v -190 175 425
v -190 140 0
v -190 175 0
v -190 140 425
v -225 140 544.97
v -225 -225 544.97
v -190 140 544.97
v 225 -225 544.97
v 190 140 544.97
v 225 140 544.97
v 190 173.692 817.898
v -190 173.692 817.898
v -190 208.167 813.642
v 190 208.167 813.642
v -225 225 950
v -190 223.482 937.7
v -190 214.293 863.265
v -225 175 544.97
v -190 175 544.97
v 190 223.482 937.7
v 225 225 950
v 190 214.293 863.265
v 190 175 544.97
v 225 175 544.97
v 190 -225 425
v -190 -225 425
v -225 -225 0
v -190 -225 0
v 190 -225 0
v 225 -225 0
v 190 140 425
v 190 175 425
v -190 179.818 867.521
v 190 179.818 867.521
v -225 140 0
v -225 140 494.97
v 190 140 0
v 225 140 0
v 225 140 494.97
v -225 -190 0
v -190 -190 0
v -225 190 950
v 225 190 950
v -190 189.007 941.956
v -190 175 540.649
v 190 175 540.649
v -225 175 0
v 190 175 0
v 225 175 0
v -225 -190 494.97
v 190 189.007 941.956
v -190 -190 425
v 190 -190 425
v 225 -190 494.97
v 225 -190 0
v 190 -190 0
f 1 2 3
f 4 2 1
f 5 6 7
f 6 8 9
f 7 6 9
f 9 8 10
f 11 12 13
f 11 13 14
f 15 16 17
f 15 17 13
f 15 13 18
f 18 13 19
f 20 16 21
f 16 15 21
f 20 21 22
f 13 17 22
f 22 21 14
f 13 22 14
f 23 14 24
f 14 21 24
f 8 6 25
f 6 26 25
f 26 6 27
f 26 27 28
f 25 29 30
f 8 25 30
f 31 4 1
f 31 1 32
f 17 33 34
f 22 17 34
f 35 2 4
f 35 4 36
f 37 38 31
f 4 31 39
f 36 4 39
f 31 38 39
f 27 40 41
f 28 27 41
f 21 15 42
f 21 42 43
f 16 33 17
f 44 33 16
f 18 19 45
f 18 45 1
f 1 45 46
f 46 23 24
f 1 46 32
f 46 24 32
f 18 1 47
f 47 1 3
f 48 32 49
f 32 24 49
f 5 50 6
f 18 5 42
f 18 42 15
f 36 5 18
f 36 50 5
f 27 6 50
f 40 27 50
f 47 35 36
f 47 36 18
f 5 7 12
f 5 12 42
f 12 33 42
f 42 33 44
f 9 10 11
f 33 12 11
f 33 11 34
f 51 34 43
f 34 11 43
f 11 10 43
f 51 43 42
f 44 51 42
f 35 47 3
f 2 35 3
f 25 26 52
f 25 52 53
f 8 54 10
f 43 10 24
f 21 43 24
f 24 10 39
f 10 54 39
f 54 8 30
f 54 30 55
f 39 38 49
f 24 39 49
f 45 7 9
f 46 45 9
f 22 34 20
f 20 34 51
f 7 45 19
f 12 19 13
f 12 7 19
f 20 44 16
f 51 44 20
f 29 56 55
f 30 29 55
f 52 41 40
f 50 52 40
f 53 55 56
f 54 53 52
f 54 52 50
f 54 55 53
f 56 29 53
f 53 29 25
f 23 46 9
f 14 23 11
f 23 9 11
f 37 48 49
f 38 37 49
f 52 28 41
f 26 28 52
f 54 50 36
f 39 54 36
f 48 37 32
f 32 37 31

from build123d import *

# Parameters (mm, degrees)
F0_W     = 450
F0_H     = 450
F1_DEPTH = 950
F2_W     = 330
F2_H     = 494.9696660042
F2_W_2   = 50
F2_H_2   = 50
F3_DEPTH = 450.001
F4_W     = 380
F4_H     = 425
F5_DEPTH = 450.001
F6_W     = 380
F6_H     = 275
F6_H_2   = 75
F7_DEPTH = 151.1289788998


with BuildPart() as f1:
    # F0 (on Top) → F1 (new body)
    with BuildSketch(Plane.XY):
        Rectangle(F0_W, F0_H)
    extrude(amount=F1_DEPTH)

    # F2 (on face) → F3 (cut, through all)
    with BuildSketch(Plane.YZ.offset(225)):
        with Locations((-25, 247.4848330021)):
            Rectangle(F2_W, F2_H)
        with Locations((200, 247.4848330021)):
            Rectangle(F2_W_2, F2_H)
        Polygon((225, 950), (175, 544.9696660042), (225, 544.9696660042), align=None)
        with Locations((200, 519.9696660042)):
            Rectangle(F2_W_2, F2_H_2)
        Polygon((-225, 950), (-225, 544.9696660042), (140, 544.9696660042), (190, 950), align=None)
    extrude(amount=-F3_DEPTH, mode=Mode.SUBTRACT)

    # F4 (on face) → F5 (cut, through all)
    with BuildSketch(Plane.XZ.offset(225)):
        with Locations((0, 212.5)):
            Rectangle(F4_W, F4_H)
    extrude(amount=-F5_DEPTH, mode=Mode.SUBTRACT)

    # F6 (on face) → F7 (cut, through all)
    with BuildSketch(Plane(origin=(0, 71.633193695, -8.8429418345), x_dir=(1, 0, 0), z_dir=(0, -0.9924663491, 0.1225175334))):
        with Locations((0, 695.5165094381)):
            Rectangle(F6_W, F6_H)
        with Locations((0, 920.5165094381)):
            Rectangle(F6_W, F6_H_2)
    extrude(amount=-F7_DEPTH, mode=Mode.SUBTRACT)


solid = f1.part
